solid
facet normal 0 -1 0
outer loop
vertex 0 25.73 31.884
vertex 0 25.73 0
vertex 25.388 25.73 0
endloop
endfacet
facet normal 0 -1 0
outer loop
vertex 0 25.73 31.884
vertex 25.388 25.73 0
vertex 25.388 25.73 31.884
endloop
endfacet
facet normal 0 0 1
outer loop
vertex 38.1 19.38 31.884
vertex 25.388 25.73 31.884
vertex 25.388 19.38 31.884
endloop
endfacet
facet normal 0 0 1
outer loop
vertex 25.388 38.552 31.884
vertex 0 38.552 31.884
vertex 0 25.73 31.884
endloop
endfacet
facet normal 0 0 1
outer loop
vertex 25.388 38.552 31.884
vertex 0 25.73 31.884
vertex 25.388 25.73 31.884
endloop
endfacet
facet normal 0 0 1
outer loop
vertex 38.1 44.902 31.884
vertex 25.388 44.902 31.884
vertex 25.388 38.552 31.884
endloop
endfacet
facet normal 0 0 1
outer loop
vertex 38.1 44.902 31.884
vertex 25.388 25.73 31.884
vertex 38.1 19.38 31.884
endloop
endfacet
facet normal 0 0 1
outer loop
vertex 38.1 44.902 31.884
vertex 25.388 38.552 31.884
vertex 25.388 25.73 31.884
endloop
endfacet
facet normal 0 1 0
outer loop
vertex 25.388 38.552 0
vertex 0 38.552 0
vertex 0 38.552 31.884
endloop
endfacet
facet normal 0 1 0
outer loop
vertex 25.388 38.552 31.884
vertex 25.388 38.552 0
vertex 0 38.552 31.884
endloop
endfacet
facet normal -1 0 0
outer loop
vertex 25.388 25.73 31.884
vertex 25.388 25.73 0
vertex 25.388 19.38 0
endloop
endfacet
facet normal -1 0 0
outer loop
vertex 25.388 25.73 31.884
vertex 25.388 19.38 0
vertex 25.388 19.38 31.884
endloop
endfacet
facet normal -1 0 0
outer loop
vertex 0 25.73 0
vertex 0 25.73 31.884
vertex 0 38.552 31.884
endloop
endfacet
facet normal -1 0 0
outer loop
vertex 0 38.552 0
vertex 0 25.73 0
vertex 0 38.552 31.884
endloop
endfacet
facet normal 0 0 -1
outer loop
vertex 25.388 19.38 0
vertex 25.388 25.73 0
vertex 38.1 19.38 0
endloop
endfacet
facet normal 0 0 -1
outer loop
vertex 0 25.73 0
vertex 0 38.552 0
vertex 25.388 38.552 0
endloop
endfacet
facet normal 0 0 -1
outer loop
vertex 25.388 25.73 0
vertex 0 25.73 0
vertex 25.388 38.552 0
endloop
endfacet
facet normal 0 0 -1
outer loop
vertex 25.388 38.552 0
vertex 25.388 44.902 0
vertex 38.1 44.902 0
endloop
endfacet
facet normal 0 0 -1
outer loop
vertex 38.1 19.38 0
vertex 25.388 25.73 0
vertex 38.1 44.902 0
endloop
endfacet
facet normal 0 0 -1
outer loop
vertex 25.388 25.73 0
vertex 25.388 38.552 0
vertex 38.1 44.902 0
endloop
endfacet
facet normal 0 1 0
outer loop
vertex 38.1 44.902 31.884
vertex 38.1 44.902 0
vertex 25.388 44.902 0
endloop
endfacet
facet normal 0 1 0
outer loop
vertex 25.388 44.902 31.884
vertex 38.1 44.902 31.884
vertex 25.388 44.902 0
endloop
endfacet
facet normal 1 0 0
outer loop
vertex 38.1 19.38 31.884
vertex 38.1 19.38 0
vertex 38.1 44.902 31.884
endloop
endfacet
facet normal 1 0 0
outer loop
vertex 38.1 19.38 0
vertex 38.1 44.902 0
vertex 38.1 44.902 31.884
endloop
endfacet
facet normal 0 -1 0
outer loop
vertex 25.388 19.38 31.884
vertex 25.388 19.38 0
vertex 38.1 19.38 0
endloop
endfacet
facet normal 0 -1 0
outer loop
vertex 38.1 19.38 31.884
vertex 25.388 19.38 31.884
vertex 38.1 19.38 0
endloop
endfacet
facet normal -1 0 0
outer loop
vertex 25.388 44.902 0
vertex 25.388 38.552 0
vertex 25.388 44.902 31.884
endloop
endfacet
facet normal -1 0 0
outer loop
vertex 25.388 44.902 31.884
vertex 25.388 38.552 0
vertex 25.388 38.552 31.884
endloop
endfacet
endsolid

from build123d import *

# Parameters (mm, degrees)
F0_W     = 12.822116
F0_H     = 31.884328
F1_DEPTH = 38.1
F2_W     = 12.712212
F2_H     = 31.884328
F3_DEPTH = 6.35
F4_W     = 12.712212
F4_H     = 31.884328
F5_DEPTH = 6.35


with BuildPart() as f1:
    # F0 (on Right) → F1 (new body)
    with BuildSketch(Plane.YZ):
        with Locations((32.140768, 15.942164)):
            Rectangle(F0_W, F0_H)
    extrude(amount=F1_DEPTH)

    # F2 (on face) → F3 (join)
    with BuildSketch(Plane(origin=(0, 38.551826, 0), x_dir=(-1, 0, 0), z_dir=(0, 1, 0))):
        with Locations((-31.743894, 15.942164)):
            Rectangle(F2_W, F2_H)
    extrude(amount=F3_DEPTH)

    # F4 (on face) → F5 (join)
    with BuildSketch(Plane.XZ.offset(-25.72971)):
        with Locations((31.743894, 15.942164)):
            Rectangle(F4_W, F4_H)
    extrude(amount=F5_DEPTH)


solid = f1.part
